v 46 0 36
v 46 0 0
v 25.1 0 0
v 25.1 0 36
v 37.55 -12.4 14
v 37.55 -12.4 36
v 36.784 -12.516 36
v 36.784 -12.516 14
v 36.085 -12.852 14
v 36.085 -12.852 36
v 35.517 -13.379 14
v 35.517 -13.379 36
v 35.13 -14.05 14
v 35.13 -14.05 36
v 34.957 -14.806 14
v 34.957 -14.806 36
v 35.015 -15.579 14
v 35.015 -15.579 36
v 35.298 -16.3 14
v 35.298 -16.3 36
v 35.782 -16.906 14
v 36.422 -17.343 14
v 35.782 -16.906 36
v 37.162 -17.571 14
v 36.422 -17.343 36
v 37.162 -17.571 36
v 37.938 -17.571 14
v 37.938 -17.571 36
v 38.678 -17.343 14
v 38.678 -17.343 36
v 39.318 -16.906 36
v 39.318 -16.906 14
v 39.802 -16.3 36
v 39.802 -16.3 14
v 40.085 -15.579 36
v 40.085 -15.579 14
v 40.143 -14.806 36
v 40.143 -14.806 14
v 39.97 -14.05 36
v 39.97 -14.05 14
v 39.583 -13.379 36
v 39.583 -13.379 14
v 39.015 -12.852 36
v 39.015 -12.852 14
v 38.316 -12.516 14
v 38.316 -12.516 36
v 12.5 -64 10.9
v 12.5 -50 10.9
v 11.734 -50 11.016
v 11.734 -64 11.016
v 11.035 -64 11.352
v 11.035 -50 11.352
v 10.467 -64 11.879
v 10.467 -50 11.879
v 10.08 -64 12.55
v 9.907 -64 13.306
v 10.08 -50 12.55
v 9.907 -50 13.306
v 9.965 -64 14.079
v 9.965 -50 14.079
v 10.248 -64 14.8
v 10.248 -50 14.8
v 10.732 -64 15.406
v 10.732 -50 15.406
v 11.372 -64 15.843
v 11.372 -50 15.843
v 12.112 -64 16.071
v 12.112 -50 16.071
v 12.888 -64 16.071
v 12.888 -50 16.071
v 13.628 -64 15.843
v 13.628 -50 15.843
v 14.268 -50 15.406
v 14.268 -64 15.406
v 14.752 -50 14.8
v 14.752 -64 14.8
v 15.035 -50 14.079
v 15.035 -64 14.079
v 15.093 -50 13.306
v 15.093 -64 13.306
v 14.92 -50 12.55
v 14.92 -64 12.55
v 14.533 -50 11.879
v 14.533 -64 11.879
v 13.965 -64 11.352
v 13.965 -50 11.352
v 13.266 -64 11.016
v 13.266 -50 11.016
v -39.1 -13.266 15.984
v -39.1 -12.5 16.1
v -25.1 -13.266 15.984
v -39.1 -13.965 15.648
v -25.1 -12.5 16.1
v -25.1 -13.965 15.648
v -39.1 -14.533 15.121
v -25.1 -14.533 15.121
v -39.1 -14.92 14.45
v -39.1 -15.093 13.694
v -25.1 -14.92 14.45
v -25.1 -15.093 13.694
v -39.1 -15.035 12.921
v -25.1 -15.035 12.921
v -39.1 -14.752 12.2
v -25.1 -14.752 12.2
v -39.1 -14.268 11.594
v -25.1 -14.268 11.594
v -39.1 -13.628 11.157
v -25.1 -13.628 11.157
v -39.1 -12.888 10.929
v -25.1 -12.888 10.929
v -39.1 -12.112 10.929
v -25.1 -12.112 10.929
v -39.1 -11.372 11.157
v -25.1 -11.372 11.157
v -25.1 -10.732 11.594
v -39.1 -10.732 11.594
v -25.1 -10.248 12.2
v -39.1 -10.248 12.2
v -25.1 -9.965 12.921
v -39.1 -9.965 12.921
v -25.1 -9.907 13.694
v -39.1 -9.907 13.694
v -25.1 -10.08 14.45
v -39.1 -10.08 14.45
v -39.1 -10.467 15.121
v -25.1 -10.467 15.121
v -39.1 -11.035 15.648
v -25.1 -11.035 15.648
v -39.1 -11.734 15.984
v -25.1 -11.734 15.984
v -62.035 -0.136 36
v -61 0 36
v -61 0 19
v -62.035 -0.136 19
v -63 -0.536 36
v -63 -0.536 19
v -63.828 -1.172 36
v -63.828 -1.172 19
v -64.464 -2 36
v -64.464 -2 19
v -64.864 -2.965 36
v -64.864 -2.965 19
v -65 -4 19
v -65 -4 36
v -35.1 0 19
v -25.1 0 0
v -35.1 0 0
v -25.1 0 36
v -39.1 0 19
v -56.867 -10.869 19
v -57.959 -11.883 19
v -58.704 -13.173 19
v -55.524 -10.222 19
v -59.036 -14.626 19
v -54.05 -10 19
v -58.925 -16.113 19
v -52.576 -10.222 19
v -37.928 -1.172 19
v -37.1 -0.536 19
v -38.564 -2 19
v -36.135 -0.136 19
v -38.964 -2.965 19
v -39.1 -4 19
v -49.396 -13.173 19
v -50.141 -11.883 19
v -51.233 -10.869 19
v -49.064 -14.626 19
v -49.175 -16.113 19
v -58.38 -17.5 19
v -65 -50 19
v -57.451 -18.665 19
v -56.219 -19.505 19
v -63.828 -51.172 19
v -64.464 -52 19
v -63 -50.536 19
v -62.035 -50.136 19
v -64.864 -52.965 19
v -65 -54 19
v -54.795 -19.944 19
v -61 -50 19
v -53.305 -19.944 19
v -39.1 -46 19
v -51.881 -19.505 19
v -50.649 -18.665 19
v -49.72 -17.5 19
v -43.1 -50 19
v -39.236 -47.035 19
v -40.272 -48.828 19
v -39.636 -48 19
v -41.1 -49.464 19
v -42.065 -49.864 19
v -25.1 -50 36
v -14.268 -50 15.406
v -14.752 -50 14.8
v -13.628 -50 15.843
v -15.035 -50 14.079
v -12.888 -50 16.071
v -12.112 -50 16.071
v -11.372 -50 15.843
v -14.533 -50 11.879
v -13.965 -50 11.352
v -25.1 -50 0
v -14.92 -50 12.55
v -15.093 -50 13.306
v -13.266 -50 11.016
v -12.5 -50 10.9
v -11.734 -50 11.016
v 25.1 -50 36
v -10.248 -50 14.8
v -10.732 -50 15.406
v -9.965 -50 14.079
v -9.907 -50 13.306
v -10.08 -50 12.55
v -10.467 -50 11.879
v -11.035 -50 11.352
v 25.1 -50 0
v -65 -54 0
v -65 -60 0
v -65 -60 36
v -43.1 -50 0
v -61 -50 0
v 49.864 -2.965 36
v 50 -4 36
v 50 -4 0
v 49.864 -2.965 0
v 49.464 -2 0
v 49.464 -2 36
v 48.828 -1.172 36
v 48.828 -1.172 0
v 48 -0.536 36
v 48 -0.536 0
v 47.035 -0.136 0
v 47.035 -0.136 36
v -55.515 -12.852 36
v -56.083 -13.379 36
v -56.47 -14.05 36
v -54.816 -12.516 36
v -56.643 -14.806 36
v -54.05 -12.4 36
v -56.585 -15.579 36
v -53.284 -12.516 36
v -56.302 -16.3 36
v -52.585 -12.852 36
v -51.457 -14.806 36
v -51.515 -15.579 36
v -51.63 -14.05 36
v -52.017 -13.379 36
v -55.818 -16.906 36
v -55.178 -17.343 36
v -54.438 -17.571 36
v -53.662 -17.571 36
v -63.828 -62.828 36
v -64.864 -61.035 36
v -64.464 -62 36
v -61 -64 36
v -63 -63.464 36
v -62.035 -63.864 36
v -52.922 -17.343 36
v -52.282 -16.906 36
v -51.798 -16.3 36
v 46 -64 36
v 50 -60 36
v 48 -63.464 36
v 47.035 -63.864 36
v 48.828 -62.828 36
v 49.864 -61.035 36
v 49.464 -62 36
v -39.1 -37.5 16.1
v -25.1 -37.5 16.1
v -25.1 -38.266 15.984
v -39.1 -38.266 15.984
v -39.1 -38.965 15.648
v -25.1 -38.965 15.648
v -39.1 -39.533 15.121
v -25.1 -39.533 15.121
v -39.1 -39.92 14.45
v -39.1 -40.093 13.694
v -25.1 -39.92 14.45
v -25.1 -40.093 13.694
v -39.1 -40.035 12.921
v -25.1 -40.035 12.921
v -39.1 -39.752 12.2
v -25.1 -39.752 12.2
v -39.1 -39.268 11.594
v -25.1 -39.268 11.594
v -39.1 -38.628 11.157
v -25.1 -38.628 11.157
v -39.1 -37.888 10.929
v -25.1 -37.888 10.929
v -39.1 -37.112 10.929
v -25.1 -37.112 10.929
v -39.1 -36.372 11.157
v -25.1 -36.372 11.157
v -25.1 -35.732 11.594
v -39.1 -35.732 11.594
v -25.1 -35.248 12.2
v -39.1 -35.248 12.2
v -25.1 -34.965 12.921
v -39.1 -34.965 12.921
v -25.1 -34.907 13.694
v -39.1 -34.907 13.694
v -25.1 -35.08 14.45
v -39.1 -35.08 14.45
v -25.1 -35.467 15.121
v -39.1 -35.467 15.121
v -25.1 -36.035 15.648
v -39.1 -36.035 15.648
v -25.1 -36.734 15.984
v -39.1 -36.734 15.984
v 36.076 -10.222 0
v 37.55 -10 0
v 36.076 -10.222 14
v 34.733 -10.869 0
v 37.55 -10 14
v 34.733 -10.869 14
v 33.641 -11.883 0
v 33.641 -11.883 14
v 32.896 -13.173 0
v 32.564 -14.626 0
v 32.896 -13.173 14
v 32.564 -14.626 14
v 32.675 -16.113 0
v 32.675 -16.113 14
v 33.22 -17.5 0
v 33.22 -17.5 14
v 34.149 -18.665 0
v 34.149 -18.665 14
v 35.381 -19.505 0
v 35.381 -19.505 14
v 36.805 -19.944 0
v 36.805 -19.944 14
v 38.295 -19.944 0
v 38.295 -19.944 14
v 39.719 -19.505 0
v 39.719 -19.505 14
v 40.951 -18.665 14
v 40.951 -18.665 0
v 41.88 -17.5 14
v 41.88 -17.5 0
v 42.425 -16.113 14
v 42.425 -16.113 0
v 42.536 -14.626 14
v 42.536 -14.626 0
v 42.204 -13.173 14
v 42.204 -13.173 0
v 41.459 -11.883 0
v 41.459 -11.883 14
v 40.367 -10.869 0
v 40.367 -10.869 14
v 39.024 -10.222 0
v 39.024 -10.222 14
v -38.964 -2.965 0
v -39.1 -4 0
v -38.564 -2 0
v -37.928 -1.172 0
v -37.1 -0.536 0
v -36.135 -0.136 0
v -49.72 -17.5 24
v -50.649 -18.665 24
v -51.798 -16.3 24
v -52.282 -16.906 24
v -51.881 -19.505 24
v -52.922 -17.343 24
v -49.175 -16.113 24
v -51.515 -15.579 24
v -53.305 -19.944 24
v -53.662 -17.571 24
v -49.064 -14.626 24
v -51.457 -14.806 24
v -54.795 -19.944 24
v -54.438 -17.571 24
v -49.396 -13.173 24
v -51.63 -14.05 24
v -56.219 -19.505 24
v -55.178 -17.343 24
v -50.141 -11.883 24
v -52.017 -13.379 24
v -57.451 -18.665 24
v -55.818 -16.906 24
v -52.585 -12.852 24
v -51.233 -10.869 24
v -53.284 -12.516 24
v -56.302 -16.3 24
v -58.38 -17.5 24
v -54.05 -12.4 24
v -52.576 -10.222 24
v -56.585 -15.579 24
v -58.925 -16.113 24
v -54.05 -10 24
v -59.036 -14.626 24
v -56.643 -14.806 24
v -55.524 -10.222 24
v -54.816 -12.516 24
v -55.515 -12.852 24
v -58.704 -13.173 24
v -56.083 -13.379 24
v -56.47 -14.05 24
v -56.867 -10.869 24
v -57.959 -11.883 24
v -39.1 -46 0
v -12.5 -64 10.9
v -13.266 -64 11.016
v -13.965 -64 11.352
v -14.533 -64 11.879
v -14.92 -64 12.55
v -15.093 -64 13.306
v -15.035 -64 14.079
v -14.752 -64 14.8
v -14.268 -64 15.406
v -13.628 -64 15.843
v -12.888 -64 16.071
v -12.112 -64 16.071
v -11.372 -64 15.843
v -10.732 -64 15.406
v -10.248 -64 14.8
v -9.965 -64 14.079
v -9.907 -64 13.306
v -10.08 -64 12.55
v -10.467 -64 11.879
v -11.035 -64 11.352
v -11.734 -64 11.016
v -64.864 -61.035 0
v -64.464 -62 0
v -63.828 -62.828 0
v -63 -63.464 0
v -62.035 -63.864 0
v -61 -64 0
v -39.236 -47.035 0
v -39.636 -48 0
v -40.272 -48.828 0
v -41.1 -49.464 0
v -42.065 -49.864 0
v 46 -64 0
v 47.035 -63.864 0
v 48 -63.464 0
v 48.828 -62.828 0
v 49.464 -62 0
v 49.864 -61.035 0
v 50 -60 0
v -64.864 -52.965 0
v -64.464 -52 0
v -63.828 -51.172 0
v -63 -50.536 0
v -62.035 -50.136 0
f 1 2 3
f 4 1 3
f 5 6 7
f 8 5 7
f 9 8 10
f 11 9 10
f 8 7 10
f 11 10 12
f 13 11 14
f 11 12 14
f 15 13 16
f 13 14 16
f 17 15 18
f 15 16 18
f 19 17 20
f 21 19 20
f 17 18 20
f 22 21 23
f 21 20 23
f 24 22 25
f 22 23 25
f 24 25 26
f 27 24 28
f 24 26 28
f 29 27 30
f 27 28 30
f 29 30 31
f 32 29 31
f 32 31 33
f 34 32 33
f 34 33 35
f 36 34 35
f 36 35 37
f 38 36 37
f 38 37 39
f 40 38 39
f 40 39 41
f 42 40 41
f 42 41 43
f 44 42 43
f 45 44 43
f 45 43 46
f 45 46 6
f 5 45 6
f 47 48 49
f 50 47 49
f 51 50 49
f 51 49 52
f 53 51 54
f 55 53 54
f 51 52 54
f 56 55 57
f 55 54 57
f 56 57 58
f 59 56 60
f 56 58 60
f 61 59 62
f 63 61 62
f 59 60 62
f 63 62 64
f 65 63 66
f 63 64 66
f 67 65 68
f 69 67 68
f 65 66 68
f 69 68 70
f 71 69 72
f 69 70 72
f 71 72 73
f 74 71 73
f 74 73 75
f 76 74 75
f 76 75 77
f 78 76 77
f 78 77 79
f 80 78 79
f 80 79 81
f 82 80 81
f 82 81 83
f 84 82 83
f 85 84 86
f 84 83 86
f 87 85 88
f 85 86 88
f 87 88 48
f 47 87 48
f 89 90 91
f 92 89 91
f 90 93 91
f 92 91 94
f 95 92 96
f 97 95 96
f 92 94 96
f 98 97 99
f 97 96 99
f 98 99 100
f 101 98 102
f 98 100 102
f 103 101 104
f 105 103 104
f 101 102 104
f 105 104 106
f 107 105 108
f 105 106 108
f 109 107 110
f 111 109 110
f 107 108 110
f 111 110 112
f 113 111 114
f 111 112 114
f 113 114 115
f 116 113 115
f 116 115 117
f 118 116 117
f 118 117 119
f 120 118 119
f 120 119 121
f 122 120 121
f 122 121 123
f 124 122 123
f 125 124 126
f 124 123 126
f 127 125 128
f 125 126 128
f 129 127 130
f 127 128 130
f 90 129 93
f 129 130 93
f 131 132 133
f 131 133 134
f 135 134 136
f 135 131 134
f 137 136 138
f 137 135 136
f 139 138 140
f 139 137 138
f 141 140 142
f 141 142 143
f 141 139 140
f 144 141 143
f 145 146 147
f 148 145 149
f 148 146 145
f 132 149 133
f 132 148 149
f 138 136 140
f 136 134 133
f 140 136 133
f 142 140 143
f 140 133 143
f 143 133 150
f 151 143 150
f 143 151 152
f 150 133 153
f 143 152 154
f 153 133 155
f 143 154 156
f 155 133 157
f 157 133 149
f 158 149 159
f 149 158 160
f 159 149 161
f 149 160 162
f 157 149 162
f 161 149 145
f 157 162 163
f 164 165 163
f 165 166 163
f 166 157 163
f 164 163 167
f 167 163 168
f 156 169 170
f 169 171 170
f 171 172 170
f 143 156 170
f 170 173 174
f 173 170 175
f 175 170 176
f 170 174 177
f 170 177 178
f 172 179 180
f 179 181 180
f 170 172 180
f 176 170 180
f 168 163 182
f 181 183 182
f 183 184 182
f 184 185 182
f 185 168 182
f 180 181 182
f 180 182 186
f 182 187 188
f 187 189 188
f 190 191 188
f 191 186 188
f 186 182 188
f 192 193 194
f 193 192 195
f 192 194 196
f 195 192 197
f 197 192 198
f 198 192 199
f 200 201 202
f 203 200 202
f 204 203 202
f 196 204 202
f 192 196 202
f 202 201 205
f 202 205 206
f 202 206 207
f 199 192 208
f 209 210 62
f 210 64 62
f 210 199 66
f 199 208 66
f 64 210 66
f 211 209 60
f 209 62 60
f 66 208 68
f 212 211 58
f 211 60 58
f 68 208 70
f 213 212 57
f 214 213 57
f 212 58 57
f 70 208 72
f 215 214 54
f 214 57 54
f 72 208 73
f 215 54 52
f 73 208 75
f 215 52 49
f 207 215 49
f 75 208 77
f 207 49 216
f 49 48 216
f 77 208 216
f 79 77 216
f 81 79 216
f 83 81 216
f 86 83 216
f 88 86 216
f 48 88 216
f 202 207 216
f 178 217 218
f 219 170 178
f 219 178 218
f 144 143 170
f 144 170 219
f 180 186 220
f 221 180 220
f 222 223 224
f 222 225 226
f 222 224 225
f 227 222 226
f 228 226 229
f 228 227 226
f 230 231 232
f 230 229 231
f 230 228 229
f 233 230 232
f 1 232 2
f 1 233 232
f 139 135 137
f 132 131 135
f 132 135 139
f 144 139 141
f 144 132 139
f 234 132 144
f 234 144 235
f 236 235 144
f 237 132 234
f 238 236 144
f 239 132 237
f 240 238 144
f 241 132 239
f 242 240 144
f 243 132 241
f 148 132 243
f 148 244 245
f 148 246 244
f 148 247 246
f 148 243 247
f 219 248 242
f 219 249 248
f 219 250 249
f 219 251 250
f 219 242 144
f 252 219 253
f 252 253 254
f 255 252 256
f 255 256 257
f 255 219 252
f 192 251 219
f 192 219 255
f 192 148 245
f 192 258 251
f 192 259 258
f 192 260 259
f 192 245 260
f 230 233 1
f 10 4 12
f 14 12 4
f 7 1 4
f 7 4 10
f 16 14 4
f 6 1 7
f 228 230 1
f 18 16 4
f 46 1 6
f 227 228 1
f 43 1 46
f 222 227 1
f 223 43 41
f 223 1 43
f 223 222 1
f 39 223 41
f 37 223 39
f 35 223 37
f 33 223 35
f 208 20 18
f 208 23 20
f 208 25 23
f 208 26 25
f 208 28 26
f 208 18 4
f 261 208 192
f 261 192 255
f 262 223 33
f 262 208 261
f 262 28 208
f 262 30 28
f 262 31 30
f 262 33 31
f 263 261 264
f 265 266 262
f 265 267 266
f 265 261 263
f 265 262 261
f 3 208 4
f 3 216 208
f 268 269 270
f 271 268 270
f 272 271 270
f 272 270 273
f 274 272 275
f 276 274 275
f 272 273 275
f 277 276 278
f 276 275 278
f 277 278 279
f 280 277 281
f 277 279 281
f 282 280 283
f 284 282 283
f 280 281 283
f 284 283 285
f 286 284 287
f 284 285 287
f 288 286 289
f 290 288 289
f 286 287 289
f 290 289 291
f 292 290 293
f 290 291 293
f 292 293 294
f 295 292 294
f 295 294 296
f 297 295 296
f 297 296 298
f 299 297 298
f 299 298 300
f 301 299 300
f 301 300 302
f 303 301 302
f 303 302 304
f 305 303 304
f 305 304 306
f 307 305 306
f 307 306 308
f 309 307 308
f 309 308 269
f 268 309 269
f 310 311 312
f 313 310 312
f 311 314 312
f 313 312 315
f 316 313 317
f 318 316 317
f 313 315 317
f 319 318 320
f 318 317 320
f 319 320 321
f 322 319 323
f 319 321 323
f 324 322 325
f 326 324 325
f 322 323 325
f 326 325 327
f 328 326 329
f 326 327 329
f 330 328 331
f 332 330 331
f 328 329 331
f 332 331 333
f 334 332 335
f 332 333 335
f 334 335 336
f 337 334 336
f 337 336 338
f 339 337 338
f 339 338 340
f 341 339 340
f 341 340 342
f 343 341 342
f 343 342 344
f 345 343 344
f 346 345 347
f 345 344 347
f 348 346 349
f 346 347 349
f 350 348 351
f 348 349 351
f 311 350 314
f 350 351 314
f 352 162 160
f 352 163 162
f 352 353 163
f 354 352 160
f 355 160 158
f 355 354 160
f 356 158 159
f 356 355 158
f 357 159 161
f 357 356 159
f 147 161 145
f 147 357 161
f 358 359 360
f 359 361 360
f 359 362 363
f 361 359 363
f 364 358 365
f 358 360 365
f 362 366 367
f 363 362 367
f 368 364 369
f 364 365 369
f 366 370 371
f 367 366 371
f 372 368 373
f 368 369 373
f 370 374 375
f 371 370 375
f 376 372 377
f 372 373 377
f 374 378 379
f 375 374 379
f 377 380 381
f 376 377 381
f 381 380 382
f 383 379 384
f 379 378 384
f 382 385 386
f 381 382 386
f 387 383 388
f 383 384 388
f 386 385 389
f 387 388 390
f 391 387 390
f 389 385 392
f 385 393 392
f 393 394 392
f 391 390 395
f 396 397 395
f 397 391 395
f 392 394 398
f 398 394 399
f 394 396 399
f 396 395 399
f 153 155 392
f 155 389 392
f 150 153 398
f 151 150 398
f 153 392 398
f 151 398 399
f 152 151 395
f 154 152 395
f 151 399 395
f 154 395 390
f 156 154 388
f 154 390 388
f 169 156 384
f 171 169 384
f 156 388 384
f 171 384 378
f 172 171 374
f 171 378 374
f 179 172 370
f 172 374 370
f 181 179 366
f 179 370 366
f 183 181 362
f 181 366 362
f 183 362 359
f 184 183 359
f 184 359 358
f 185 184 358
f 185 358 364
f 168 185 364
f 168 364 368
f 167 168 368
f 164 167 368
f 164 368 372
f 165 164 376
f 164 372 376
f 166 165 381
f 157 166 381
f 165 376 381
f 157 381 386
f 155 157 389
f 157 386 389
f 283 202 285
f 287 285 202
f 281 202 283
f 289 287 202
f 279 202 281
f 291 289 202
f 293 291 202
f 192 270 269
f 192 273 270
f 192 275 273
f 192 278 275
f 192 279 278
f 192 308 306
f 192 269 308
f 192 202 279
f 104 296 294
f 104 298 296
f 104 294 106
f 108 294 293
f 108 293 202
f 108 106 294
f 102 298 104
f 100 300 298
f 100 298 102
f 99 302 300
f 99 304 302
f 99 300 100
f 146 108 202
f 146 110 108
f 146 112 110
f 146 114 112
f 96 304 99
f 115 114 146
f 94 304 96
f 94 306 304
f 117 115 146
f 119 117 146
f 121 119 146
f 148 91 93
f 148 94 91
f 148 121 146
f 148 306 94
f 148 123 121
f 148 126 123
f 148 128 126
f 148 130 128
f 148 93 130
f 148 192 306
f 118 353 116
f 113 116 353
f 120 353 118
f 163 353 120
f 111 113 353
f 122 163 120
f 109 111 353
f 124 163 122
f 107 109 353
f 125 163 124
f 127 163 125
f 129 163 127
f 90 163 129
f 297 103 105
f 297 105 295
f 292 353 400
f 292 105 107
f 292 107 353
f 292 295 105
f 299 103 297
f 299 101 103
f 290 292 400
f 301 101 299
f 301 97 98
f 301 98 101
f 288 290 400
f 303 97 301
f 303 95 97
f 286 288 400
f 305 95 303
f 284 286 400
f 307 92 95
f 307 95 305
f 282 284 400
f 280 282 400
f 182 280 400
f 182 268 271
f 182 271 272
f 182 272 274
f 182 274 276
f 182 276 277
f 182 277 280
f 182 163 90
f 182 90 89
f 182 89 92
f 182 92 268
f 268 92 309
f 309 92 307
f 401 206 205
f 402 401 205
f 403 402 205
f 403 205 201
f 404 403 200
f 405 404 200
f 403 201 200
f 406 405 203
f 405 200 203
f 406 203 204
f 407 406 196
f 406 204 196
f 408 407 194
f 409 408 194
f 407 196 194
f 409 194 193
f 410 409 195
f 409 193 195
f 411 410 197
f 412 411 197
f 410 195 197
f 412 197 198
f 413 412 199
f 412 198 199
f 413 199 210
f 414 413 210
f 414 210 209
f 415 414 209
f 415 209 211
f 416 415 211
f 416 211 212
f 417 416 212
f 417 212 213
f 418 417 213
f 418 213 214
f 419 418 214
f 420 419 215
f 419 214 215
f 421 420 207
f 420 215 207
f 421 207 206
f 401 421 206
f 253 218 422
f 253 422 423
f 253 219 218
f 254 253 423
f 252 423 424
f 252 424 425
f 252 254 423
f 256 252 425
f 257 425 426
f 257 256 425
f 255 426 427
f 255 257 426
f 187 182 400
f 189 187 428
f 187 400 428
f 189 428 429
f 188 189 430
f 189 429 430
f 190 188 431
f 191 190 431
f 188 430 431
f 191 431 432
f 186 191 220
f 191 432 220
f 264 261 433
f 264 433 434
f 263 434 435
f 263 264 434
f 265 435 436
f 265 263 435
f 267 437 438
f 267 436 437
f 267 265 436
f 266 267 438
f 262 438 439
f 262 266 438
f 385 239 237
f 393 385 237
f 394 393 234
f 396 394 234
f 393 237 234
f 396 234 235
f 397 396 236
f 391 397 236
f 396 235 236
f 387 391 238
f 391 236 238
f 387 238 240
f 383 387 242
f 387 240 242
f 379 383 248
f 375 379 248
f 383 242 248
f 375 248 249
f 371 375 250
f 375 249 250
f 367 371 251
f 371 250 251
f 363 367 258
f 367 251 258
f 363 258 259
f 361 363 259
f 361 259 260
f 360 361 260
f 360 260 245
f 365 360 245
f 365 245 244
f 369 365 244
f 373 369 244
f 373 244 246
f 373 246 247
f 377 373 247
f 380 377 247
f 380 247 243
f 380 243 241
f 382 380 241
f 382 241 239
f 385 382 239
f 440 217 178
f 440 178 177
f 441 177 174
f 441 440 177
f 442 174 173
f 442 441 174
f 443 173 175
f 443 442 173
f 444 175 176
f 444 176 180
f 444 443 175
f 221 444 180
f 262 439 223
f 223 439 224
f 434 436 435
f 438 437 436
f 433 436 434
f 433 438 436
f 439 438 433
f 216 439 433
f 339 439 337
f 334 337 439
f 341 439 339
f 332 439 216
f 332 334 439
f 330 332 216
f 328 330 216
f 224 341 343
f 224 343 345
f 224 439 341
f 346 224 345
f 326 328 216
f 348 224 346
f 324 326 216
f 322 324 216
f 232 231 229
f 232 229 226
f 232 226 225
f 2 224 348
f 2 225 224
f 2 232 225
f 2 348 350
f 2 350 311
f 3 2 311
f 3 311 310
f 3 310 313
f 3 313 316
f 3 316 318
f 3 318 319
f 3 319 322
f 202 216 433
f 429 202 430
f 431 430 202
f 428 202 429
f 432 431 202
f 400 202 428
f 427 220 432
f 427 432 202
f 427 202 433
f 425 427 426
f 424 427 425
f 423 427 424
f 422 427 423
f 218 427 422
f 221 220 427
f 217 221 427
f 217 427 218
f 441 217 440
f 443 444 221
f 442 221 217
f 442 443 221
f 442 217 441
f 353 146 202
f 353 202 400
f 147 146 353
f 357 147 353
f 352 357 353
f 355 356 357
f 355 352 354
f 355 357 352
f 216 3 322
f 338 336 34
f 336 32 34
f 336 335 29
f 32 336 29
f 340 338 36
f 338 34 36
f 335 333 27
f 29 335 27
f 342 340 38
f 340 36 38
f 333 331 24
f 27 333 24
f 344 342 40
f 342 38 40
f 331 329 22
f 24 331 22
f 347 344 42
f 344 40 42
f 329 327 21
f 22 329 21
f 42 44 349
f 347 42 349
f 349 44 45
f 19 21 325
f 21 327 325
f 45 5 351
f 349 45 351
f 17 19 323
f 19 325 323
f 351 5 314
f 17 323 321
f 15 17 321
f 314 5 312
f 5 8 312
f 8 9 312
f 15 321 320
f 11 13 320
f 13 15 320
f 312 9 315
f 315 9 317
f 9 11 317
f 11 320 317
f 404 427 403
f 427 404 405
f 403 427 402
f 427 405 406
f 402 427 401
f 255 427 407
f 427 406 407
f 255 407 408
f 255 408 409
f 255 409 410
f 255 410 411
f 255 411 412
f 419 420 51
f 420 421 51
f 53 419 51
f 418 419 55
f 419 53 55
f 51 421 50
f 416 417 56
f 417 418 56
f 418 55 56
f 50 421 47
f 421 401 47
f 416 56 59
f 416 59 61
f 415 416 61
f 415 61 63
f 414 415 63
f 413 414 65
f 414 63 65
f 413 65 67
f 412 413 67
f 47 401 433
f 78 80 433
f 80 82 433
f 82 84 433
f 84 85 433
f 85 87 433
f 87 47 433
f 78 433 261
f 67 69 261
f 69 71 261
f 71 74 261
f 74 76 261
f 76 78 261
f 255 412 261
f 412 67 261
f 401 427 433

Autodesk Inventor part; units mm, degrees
ref_plane "YZ Plane" through (0, 0, 0) normal (1, 0, 0) x (0, 1, 0)
ref_plane "XZ Plane" through (0, 0, 0) normal (0, 1, 0) x (-1, 0, 0)
ref_plane "XY Plane" through (0, 0, 0) normal (0, 0, 1) x (1, 0, 0)
sketch "Sketch1" plane through (0, 0, 0) normal (0, 0, 1) x (1, 0, 0)
  line L0 (-50, -64) -> (50, -64)
  line L1 (50, -64) -> (50, 0)
  line L2 (50, 0) -> (-50, 0)
  line L3 (-50, 0) -> (-50, -64)
  line L4 (-50, -64) -> (50, 0) construction
  line L5 (50, -64) -> (-50, 0) construction
  line L6 (-25.1, -50) -> (25.1, -50)
  line L7 (25.1, -50) -> (25.1, 0)
  line L8 (25.1, 0) -> (-25.1, 0)
  line L9 (-25.1, 0) -> (-25.1, -50)
  line L10 (-25.1, -50) -> (25.1, 0) construction
  line L11 (25.1, -50) -> (-25.1, 0) construction
  point P0 (0, 0)
  point P1 (0, -32)
  point P2 (0, 0)
  point P3 (0, -25)
  point P4 (-25.1, 0)
  dimension "d0" = 100
  dimension "d1" = 64
  dimension "d2" = 50.2
  dimension "d3" = 50
extrude "Extrusion1" add sketch "Sketch1" along normal blind 36 contours L3 L2 L9 L6 L7 L1 L0
sketch "Sketch2" plane through (0, 0, 0) normal (0, 0, -1) x (-1, 0, 0)
  line L0 (-50, 0) -> (-25.1, 0) projected
  line L1 (-25.1, 0) -> (-25.1, -50) projected
  line L2 (-25.1, -50) -> (25.1, -50) projected
  line L3 (25.1, -50) -> (25.1, 0) projected
  line L4 (25.1, 0) -> (50, 0) projected
  line L5 (50, 0) -> (50, -64) projected
  line L6 (50, -64) -> (-50, -64) projected
  line L7 (-50, -64) -> (-50, 0) projected
  line L8 (25.1, 0) -> (50, 0)
  line L9 (50, 0) -> (50, -50)
  line L10 (50, -50) -> (25.1, -50)
  line L11 (25.1, -50) -> (25.1, 0)
  point P0 (0, 0)
  point P1 (25.1, -50)
extrude "Extrusion2" cut sketch "Sketch2" against normal blind 19 contours L3 L4 L5 L10
sketch "Sketch3" plane through (-50, -64, 0) normal (-1, 0, 0) x (0, 0, 1)
  line L0 (19, 64) -> (19, 14) projected
  line L1 (19, 14) -> (0, 14) projected
  line L2 (0, 14) -> (0, 0) projected
  line L3 (0, 0) -> (36, 0) projected
  line L4 (36, 64) -> (36, 0) projected
  line L5 (19, 64) -> (36, 64) projected
  point P0 (0, 64)
extrude "Extrusion3" add sketch "Sketch3" along normal blind 15
sketch "Sketch4" plane through (0, 0, 0) normal (0, 0, -1) x (-1, 0, 0)
  line L0 (-25.1, -50) -> (65, -50) projected
  line L1 (-25.1, 0) -> (-25.1, -50) projected
  line L2 (-50, 0) -> (-25.1, 0) projected
  line L3 (-50, -64) -> (-50, 0) projected
  line L4 (-50, -64) -> (65, -64) projected
  line L5 (65, -50) -> (65, -64) projected
  line L6 (-50, 0) -> (-25.1, 0) projected
  point P0 (0, 0)
  point P1 (-37.55, -15)
  point P2 (-37.55, 0)
  point P3 (-37.55, 0)
  dimension "d10" = 15
hole "Hole1" at (37.55, -15, 0) direction (0, 0, 1) diameter 5.2 end through all counterbore diameter 10 counterbore depth 14
sketch "Sketch5" plane through (0, 0, 19) normal (0, 0, -1) x (-1, 0, 0)
  line L0 (25.1, 0) -> (65, 0) projected
  line L1 (25.1, -50) -> (25.1, 0) projected
  line L2 (65, -50) -> (25.1, -50) projected
  line L3 (65, 0) -> (65, -50) projected
  line L4 (36.05, -15) -> (54.05, -15) construction
  point P0 (0, 0)
  point P1 (45.05, 0)
  point P2 (45.05, -15)
  dimension "d18" = 18
  dimension "d19" = 15
hole "Hole2" at (-54.05, -15, 19) direction (0, 0, 1) diameter 5.2 end through all counterbore diameter 10 counterbore depth 5
sketch "Sketch6" plane through (0, 0, 19) normal (0, 0, -1) x (-1, 0, 0)
  circle A0 centre (54.05, -15) radius 5 projected
  line L0 (25.1, 0) -> (65, 0) projected
  line L1 (25.1, -50) -> (25.1, 0) projected
  line L2 (65, -50) -> (25.1, -50) projected
  line L3 (65, 0) -> (65, -50) projected
  line L4 (25.1, 0) -> (39.1, 0)
  line L5 (39.1, 0) -> (39.1, -50)
  line L6 (39.1, -50) -> (25.1, -50)
  line L7 (25.1, -50) -> (25.1, 0)
  point P0 (0, 0)
  point P1 (39.1, 0)
  dimension "d27" = 14
extrude "Extrusion4" add sketch "Sketch6" along normal up to surface (19 mm away) contours L0 L5 L2 L1
sketch "Sketch7" plane through (-39.1, -50, 19) normal (-1, 0, 0) x (0, 0, 1)
  circle A0 centre (-5.5, 37.5) radius 2.067 projected
  circle A1 centre (-5.5, 12.5) radius 2.067 projected
  point P0 (-19, 50)
hole "Hole3" at (-39.1, -12.5, 13.5) at (-39.1, -37.5, 13.5) direction (1, 0, 0) diameter 5.2 depth 14
sketch "Sketch8" plane through (50, -64, 0) normal (0, -1, 0) x (1, 0, 0)
  circle A0 centre (-37.5, 13.5) radius 2.067 projected
  circle A1 centre (-62.5, 13.5) radius 2.067 projected
  point P0 (-50, 0)
hole "Hole4" at (12.5, -64, 13.5) at (-12.5, -64, 13.5) direction (0, 1, 0) diameter 5.2 end through all
fillet "Fillet1" radius 4 7 edges at (50, 0, 18) (50, -64, 18) (-65, -64, 18) (-65, 0, 27.5) (-39.1, -50, 9.5) (-39.1, 0, 9.5) (-65, -50, 9.5)
properties part number "lift_encoder_frame" material "ABS Plastic"
